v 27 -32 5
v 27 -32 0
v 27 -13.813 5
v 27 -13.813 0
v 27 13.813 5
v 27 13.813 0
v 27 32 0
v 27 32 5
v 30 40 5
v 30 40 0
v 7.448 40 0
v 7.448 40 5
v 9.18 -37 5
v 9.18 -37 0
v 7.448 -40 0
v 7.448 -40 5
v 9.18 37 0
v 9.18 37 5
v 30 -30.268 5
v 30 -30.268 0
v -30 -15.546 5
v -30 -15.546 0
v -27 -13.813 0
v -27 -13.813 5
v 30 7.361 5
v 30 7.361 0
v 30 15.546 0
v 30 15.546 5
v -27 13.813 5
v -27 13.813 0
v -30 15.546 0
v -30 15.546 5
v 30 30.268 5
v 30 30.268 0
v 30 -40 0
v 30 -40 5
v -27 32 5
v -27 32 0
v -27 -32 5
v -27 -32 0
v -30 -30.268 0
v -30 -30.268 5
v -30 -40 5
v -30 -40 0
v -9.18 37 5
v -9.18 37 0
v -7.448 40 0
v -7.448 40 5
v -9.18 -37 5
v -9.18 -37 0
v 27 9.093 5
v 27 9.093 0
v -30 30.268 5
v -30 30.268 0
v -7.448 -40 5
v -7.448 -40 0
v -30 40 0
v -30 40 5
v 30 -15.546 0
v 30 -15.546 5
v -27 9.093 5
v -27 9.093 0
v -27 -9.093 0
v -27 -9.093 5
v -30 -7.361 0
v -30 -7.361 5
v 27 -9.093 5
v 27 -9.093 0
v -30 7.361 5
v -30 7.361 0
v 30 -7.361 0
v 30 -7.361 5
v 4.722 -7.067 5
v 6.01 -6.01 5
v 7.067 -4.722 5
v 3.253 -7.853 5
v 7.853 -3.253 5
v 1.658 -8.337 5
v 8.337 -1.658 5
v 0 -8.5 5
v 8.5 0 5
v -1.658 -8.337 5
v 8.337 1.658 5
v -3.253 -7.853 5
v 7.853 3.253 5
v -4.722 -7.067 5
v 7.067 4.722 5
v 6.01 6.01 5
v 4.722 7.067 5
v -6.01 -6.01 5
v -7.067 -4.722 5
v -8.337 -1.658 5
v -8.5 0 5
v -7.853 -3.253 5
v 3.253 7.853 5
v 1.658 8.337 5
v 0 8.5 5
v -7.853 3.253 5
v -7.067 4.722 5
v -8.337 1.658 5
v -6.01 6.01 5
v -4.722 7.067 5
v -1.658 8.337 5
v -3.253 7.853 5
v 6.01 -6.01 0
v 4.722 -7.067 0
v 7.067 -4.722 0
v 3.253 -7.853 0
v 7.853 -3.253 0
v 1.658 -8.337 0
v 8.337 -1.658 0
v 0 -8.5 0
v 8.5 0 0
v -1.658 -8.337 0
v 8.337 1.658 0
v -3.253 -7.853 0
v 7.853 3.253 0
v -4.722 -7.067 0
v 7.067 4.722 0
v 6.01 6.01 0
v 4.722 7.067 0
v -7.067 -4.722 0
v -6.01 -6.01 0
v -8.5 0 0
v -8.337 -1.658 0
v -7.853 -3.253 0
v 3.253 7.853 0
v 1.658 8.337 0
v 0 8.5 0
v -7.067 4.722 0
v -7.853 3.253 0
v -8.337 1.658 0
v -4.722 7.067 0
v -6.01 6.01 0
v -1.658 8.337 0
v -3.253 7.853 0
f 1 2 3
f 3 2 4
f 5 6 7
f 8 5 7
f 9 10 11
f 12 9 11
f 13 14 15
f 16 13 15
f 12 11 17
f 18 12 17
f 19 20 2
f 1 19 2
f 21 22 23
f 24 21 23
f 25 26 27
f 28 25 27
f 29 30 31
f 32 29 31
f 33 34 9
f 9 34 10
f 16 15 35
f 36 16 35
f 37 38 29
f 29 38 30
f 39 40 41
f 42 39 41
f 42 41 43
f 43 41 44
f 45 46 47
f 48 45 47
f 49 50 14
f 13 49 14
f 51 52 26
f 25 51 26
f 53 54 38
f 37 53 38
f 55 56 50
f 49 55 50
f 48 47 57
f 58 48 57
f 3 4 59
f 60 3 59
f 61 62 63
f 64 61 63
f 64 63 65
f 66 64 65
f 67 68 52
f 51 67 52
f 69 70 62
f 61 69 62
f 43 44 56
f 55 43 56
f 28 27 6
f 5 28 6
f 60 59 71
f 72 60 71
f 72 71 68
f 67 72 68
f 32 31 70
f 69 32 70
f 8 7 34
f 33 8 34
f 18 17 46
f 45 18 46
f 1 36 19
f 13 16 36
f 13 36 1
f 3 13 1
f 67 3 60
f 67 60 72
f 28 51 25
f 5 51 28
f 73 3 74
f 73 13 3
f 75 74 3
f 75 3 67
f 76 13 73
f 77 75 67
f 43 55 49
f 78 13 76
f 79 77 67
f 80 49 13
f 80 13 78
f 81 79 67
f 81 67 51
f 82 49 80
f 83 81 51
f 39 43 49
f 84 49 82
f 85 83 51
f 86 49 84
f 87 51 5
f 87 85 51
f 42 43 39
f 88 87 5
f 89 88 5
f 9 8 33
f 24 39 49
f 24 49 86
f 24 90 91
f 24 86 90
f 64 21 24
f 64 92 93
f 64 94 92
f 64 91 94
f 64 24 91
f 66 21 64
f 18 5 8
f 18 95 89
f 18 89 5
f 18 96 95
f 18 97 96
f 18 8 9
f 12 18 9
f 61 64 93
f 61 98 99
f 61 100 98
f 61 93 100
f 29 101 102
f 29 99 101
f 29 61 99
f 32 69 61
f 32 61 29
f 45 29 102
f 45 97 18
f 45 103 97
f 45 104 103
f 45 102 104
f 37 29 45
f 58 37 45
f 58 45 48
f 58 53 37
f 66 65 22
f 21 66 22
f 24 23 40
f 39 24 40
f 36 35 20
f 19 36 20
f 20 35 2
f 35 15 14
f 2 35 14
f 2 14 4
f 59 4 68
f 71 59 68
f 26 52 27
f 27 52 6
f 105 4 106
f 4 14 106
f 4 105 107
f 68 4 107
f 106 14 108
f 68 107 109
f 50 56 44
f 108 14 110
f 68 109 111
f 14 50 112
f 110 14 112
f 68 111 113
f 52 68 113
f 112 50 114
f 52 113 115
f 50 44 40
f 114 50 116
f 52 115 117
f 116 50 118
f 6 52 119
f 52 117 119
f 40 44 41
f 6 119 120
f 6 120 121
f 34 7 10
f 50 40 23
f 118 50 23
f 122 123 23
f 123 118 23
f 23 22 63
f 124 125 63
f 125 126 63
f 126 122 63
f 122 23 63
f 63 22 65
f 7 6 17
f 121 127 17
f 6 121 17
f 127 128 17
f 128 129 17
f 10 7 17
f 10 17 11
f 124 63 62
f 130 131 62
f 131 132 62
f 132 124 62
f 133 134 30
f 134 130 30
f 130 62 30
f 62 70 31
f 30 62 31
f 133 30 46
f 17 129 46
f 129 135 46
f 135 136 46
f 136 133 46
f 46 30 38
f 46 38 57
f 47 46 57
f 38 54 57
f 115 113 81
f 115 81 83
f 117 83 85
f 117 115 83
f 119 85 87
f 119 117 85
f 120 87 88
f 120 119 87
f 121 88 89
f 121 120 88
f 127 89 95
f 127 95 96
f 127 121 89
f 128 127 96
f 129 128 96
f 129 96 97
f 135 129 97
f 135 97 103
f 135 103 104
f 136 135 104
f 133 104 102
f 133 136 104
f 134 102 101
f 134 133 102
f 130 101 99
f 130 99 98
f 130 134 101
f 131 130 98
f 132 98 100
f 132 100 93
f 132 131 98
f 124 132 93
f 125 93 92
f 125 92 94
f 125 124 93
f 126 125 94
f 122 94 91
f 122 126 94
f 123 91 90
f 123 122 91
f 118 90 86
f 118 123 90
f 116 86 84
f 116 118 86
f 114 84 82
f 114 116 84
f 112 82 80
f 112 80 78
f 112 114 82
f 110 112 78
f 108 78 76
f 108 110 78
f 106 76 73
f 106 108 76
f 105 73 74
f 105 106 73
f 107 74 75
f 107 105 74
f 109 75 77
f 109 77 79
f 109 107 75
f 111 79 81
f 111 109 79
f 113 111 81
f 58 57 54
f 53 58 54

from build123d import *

# Parameters (mm, degrees)
SKETCH4_R           = 8.5
BOSS_EXTRUDE1_DEPTH = 5


with BuildPart() as part:
    # Sketch4 → Boss-Extrude1 (new body)
    with BuildSketch(Plane(origin=(0, 0, 0), x_dir=(0, 1, 0), z_dir=(0, 0, 1))):
        Polygon((-40, -30), (-30.267949192, -30), (-32, -27), (-22.90673326, -27), (-13.813466521, -27), (-15.545517328, -30), (-7.361215932, -30), (-9.09326674, -27), (3.1e-08, -27), (9.09326674, -27), (7.361215932, -30), (15.545517328, -30), (13.813466521, -27), (22.90673326, -27), (32, -27), (30.267949192, -30), (40, -30), (40, -7.447818473), (37, -9.17986928), (37, -5.1e-08), (37, 9.17986928), (40, 7.447818473), (40, 30), (30.267949192, 30), (32, 27), (22.90673326, 27), (13.813466521, 27), (15.545517328, 30), (7.361215932, 30), (9.09326674, 27), (0, 27), (-9.09326674, 27), (-7.361215932, 30), (-15.545517328, 30), (-13.813466521, 27), (-22.90673326, 27), (-32, 27), (-30.267949192, 30), (-40, 30), (-40, 7.447818473), (-37, 9.17986928), (-37, 0), (-37, -9.17986928), (-40, -7.447818473), align=None)
        with Locations(Location((0, 0, 0), (0, 0, 270))):
            Circle(SKETCH4_R, mode=Mode.SUBTRACT)
    extrude(amount=BOSS_EXTRUDE1_DEPTH)


solid = part.part
